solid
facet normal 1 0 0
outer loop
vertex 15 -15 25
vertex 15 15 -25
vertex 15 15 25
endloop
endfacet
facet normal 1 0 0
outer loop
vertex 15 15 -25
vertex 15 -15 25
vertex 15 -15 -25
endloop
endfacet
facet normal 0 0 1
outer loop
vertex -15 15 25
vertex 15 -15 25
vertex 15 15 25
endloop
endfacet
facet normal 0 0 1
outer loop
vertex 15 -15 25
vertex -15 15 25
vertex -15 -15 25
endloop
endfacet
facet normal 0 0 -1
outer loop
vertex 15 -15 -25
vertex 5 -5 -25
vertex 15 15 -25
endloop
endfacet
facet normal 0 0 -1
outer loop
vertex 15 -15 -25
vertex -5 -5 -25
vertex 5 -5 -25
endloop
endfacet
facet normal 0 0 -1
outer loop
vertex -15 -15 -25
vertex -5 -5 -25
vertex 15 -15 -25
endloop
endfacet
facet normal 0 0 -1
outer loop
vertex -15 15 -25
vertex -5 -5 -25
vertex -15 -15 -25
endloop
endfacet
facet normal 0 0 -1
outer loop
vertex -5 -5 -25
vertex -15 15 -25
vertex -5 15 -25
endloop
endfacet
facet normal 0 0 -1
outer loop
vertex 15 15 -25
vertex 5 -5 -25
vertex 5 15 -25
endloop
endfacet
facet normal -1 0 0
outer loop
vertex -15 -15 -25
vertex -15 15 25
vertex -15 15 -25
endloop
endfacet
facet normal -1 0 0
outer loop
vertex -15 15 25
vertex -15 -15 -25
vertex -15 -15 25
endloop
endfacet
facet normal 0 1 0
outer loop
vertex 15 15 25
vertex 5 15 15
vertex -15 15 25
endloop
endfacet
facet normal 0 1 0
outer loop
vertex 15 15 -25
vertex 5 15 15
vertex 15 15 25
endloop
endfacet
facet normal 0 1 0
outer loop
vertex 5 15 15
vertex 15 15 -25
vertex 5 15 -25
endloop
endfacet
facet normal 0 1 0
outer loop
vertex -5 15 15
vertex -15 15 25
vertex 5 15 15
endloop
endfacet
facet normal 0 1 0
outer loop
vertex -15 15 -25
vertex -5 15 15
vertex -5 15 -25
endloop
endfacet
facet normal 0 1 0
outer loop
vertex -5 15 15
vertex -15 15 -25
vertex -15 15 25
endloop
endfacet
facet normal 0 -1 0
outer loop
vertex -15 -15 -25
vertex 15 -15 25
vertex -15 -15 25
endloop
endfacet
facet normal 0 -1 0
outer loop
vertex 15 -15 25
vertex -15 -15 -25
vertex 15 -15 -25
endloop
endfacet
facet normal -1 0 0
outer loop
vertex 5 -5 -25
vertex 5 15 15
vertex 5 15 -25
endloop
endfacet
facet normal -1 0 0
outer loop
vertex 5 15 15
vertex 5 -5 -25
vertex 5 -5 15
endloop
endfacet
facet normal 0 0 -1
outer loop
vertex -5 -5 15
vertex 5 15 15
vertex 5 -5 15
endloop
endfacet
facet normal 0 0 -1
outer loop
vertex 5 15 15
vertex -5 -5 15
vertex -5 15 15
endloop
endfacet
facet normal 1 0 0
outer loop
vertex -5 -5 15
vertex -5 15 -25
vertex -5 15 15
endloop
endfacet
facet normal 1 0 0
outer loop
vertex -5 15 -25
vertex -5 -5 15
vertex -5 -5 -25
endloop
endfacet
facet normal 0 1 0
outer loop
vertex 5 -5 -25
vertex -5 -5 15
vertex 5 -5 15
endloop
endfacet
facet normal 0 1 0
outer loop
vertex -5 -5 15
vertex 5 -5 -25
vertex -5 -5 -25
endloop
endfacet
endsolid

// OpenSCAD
difference() {
	cube(center = true, size = [30, 30, 50]);
	translate(v = [0, 10, -10]) {
		cube(center = true, size = [10, 30, 50]);
	}
}
/***********************************************
*********      SolidPython code:      **********
************************************************
 
__author__ = 'Mark Weinreuter'

from solid.utils import *

from config import *

mirror_thickness = 8

c = cylinder(block_r_mm, h=block_base_h_mm, center=True, segments=6)
c1 = cylinder(block_hole_r_mm, h=block_hole_h_mm, center=True, segments=256)

cut = cube([block_r_mm * 3, mirror_thickness, block_base_h_mm], center=True)

rotz = lambda z: rotate([0, 0, z])

cut = rotz([0, 0, 90 + 60])(up(block_base_h_mm / 2)(cut))

# holes_rots = (60, 60 + 180, 60 + 90, (60 + 90 + 180))
# holes = []
# for rot in holes_rots:
#    holes.append(
#        up(block_base_h_mm / 2)(rotate([0, 0, rot])(left(connector_dist_mm)(cylinder(connector_r_mm, h=block_base_h_mm, center=True, segments=256)))))


cable_hole = cylinder(cable_r_mm, h=block_base_h_mm * 10, center=True)
base = c + down((block_base_h_mm + block_hole_h_mm) / 2)(c1)
# base -= cable_hole
# for h in holes:
#    base -= h

turret_w = 30
turret_height = 50
turret_th = 10
t = cube([turret_w, turret_w, turret_height], center=True)
t_cutout = cube([turret_w - 2 * turret_th, turret_w, turret_height], center=True)
t -= translate([0, turret_th, -turret_th])(t_cutout)

base -= cut

scad_render_to_file(t, "scad/block_turret.scad")
scad_render_to_file(base, "scad/block_base.scad")
 
 
************************************************/
